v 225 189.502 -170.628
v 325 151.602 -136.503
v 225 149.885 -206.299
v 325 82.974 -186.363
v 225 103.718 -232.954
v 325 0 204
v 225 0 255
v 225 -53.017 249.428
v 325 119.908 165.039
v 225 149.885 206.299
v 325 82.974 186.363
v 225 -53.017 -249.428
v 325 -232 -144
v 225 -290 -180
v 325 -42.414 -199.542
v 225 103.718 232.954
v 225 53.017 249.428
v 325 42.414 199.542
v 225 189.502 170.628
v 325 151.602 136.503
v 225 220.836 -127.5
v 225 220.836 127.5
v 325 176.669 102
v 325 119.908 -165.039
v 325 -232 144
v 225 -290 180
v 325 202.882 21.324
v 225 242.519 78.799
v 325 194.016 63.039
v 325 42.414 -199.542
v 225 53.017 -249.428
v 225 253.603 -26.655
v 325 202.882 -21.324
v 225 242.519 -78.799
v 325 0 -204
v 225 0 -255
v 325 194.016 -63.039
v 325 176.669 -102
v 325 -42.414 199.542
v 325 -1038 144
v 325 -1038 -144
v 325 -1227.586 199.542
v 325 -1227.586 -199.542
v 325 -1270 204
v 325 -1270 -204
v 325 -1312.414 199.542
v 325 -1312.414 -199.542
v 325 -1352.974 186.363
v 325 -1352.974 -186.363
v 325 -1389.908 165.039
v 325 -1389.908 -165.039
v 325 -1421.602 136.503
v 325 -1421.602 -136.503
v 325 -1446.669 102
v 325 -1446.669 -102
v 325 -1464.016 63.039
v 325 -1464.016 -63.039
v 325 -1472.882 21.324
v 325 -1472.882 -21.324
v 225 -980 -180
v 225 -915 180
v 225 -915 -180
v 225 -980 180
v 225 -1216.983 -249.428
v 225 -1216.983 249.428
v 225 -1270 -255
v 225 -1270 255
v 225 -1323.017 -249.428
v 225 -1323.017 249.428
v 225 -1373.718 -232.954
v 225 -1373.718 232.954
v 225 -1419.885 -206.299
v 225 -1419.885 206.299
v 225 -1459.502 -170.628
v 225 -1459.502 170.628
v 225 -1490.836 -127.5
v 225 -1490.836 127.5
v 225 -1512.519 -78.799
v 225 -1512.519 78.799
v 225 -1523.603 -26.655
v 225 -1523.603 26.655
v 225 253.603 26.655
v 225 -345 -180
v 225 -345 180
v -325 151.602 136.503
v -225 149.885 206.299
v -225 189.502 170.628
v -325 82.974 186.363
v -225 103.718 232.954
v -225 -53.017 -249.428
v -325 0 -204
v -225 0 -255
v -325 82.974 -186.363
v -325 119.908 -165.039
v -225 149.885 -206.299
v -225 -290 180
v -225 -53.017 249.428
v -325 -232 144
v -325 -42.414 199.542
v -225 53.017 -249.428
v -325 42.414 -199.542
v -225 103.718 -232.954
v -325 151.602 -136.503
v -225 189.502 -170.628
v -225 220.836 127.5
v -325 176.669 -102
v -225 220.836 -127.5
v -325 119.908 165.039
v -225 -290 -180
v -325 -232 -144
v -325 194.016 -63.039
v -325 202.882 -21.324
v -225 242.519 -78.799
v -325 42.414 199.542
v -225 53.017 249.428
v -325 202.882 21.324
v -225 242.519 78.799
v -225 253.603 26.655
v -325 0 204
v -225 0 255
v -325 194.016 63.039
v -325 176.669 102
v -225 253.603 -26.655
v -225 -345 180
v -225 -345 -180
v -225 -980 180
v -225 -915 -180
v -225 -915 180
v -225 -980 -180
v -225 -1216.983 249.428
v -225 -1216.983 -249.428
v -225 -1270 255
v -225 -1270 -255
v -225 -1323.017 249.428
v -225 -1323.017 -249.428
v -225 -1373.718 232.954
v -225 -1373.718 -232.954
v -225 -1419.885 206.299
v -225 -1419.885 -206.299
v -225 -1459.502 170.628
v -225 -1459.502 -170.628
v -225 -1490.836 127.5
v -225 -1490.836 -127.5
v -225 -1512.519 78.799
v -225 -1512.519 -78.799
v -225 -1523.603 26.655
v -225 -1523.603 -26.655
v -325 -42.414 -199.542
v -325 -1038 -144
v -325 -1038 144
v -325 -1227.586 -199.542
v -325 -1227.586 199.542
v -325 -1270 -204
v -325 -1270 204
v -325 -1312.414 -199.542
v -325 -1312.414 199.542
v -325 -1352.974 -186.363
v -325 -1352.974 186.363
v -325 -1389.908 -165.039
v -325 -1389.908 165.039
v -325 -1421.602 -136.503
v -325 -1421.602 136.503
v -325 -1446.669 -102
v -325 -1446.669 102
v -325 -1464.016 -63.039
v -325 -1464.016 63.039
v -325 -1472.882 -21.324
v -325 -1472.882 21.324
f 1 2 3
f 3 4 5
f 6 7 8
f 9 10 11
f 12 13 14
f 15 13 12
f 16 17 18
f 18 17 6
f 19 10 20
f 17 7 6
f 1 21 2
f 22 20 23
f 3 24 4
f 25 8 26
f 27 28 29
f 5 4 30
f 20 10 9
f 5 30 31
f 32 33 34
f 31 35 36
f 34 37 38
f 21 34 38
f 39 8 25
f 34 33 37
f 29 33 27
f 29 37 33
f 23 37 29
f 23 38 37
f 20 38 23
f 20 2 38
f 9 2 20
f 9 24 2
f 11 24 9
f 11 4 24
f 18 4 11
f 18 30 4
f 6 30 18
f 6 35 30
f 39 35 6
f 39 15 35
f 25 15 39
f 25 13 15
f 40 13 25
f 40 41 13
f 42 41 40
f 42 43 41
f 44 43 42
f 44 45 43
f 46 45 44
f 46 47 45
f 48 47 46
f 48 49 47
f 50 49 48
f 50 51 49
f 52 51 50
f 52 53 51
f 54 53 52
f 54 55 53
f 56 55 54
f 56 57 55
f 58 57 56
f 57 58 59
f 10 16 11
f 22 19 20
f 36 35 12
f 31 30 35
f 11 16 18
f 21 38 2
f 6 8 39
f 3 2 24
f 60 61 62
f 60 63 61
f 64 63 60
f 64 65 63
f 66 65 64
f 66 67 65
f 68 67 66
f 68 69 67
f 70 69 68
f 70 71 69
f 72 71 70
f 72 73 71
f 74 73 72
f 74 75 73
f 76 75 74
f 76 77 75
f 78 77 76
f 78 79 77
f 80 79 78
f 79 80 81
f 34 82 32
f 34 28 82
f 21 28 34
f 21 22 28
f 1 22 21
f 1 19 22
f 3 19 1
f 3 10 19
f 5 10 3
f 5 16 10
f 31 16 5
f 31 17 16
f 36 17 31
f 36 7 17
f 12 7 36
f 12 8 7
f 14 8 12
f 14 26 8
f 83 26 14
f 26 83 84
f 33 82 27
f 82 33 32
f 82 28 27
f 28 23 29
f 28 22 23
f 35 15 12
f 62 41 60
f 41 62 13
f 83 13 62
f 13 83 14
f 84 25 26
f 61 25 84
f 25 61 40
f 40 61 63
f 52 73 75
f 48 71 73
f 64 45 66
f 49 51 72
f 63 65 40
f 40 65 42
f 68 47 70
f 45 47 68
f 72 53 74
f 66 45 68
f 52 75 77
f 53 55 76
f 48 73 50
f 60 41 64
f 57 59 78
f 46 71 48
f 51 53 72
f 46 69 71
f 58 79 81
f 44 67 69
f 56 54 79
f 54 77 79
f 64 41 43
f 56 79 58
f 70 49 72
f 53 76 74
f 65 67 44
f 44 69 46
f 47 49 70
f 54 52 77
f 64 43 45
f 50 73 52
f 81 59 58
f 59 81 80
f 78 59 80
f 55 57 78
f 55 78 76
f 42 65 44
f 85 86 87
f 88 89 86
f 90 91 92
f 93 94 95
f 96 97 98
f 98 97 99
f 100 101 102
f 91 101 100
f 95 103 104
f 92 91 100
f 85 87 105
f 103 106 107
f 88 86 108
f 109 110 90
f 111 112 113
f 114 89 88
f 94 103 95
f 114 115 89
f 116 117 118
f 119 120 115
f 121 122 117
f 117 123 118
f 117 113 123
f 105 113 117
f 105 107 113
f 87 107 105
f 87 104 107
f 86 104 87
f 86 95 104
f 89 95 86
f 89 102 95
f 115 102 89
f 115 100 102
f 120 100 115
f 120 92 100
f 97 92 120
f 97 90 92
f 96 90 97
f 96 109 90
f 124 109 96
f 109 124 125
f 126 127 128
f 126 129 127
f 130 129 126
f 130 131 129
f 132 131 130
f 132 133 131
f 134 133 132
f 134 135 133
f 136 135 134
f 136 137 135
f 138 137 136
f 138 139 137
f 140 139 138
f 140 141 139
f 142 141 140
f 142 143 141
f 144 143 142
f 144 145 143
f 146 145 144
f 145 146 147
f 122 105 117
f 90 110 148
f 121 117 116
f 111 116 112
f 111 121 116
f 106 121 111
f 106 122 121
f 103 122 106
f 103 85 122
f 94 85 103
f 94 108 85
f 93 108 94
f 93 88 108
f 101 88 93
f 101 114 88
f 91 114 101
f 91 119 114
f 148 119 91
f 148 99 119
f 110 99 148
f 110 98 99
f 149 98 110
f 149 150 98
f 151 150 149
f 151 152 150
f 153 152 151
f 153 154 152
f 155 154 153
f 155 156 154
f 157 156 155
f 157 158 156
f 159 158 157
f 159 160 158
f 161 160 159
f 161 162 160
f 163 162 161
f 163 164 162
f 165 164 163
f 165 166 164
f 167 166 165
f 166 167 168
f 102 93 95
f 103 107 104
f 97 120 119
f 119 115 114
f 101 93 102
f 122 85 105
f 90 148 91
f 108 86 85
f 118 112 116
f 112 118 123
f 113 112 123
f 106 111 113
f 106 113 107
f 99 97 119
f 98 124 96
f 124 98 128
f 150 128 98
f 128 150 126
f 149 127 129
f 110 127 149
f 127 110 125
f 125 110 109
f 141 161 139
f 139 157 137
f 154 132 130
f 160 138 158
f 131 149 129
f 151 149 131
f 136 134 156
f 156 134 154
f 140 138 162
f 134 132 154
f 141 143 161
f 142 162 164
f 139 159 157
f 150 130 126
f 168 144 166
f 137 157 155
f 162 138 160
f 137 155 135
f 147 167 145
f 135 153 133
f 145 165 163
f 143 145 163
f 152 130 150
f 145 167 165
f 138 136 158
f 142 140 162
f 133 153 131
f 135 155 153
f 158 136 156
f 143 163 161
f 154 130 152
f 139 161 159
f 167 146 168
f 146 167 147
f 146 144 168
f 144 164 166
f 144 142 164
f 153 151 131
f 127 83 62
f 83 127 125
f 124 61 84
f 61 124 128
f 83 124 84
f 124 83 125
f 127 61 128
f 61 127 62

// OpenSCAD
// Brazo Superior del robot

translate([225,0,0])
rotate([0,90,0])  
union()
{
	union()
	{
		linear_extrude(height = 100, center = false, convexity = 10, scale=0.8)
		hull()
		{
			circle(r=255);
			translate([0,-145,0])square([360,290],center=true);
		}
 
		translate([-180,-145,0])
		rotate([90,0,0])   
		linear_extrude(height = 900, center = false, convexity = 10, scale=1)
		polygon(points=[[0,0],[360,0],[324,100],[36,100]]);

		translate([0,-1270,0])
		rotate([0,0,180])  
		linear_extrude(height = 100, center = false, convexity = 10, scale=0.8)
		hull() 
		{
			circle(r=255);
			translate([0,-145,0])square([360,290],center=true);
		}
	}

	translate([0,-0,-450])
	rotate([0,180,0])  
	union()
	{
		linear_extrude(height = 100, center = false, convexity = 10, scale=0.8)
		hull()
		{
			circle(r=255);
			translate([0,-145,0])square([360,290],center=true);
		}
 
		translate([-180,-145,0])
		rotate([90,0,0])   
		linear_extrude(height = 900, center = false, convexity = 10, scale=1)
		polygon(points=[[0,0],[360,0],[324,100],[36,100]]);

		translate([0,-1270,0])
		rotate([0,0,180])  
		linear_extrude(height = 100, center = false, convexity = 10, scale=0.8)
		hull() 
		{
			circle(r=255);
			translate([0,-145,0])square([360,290],center=true);
		}
	}

	translate([-0,-630,-225]) cube(size = [360,570,450], center = true);
}
		
